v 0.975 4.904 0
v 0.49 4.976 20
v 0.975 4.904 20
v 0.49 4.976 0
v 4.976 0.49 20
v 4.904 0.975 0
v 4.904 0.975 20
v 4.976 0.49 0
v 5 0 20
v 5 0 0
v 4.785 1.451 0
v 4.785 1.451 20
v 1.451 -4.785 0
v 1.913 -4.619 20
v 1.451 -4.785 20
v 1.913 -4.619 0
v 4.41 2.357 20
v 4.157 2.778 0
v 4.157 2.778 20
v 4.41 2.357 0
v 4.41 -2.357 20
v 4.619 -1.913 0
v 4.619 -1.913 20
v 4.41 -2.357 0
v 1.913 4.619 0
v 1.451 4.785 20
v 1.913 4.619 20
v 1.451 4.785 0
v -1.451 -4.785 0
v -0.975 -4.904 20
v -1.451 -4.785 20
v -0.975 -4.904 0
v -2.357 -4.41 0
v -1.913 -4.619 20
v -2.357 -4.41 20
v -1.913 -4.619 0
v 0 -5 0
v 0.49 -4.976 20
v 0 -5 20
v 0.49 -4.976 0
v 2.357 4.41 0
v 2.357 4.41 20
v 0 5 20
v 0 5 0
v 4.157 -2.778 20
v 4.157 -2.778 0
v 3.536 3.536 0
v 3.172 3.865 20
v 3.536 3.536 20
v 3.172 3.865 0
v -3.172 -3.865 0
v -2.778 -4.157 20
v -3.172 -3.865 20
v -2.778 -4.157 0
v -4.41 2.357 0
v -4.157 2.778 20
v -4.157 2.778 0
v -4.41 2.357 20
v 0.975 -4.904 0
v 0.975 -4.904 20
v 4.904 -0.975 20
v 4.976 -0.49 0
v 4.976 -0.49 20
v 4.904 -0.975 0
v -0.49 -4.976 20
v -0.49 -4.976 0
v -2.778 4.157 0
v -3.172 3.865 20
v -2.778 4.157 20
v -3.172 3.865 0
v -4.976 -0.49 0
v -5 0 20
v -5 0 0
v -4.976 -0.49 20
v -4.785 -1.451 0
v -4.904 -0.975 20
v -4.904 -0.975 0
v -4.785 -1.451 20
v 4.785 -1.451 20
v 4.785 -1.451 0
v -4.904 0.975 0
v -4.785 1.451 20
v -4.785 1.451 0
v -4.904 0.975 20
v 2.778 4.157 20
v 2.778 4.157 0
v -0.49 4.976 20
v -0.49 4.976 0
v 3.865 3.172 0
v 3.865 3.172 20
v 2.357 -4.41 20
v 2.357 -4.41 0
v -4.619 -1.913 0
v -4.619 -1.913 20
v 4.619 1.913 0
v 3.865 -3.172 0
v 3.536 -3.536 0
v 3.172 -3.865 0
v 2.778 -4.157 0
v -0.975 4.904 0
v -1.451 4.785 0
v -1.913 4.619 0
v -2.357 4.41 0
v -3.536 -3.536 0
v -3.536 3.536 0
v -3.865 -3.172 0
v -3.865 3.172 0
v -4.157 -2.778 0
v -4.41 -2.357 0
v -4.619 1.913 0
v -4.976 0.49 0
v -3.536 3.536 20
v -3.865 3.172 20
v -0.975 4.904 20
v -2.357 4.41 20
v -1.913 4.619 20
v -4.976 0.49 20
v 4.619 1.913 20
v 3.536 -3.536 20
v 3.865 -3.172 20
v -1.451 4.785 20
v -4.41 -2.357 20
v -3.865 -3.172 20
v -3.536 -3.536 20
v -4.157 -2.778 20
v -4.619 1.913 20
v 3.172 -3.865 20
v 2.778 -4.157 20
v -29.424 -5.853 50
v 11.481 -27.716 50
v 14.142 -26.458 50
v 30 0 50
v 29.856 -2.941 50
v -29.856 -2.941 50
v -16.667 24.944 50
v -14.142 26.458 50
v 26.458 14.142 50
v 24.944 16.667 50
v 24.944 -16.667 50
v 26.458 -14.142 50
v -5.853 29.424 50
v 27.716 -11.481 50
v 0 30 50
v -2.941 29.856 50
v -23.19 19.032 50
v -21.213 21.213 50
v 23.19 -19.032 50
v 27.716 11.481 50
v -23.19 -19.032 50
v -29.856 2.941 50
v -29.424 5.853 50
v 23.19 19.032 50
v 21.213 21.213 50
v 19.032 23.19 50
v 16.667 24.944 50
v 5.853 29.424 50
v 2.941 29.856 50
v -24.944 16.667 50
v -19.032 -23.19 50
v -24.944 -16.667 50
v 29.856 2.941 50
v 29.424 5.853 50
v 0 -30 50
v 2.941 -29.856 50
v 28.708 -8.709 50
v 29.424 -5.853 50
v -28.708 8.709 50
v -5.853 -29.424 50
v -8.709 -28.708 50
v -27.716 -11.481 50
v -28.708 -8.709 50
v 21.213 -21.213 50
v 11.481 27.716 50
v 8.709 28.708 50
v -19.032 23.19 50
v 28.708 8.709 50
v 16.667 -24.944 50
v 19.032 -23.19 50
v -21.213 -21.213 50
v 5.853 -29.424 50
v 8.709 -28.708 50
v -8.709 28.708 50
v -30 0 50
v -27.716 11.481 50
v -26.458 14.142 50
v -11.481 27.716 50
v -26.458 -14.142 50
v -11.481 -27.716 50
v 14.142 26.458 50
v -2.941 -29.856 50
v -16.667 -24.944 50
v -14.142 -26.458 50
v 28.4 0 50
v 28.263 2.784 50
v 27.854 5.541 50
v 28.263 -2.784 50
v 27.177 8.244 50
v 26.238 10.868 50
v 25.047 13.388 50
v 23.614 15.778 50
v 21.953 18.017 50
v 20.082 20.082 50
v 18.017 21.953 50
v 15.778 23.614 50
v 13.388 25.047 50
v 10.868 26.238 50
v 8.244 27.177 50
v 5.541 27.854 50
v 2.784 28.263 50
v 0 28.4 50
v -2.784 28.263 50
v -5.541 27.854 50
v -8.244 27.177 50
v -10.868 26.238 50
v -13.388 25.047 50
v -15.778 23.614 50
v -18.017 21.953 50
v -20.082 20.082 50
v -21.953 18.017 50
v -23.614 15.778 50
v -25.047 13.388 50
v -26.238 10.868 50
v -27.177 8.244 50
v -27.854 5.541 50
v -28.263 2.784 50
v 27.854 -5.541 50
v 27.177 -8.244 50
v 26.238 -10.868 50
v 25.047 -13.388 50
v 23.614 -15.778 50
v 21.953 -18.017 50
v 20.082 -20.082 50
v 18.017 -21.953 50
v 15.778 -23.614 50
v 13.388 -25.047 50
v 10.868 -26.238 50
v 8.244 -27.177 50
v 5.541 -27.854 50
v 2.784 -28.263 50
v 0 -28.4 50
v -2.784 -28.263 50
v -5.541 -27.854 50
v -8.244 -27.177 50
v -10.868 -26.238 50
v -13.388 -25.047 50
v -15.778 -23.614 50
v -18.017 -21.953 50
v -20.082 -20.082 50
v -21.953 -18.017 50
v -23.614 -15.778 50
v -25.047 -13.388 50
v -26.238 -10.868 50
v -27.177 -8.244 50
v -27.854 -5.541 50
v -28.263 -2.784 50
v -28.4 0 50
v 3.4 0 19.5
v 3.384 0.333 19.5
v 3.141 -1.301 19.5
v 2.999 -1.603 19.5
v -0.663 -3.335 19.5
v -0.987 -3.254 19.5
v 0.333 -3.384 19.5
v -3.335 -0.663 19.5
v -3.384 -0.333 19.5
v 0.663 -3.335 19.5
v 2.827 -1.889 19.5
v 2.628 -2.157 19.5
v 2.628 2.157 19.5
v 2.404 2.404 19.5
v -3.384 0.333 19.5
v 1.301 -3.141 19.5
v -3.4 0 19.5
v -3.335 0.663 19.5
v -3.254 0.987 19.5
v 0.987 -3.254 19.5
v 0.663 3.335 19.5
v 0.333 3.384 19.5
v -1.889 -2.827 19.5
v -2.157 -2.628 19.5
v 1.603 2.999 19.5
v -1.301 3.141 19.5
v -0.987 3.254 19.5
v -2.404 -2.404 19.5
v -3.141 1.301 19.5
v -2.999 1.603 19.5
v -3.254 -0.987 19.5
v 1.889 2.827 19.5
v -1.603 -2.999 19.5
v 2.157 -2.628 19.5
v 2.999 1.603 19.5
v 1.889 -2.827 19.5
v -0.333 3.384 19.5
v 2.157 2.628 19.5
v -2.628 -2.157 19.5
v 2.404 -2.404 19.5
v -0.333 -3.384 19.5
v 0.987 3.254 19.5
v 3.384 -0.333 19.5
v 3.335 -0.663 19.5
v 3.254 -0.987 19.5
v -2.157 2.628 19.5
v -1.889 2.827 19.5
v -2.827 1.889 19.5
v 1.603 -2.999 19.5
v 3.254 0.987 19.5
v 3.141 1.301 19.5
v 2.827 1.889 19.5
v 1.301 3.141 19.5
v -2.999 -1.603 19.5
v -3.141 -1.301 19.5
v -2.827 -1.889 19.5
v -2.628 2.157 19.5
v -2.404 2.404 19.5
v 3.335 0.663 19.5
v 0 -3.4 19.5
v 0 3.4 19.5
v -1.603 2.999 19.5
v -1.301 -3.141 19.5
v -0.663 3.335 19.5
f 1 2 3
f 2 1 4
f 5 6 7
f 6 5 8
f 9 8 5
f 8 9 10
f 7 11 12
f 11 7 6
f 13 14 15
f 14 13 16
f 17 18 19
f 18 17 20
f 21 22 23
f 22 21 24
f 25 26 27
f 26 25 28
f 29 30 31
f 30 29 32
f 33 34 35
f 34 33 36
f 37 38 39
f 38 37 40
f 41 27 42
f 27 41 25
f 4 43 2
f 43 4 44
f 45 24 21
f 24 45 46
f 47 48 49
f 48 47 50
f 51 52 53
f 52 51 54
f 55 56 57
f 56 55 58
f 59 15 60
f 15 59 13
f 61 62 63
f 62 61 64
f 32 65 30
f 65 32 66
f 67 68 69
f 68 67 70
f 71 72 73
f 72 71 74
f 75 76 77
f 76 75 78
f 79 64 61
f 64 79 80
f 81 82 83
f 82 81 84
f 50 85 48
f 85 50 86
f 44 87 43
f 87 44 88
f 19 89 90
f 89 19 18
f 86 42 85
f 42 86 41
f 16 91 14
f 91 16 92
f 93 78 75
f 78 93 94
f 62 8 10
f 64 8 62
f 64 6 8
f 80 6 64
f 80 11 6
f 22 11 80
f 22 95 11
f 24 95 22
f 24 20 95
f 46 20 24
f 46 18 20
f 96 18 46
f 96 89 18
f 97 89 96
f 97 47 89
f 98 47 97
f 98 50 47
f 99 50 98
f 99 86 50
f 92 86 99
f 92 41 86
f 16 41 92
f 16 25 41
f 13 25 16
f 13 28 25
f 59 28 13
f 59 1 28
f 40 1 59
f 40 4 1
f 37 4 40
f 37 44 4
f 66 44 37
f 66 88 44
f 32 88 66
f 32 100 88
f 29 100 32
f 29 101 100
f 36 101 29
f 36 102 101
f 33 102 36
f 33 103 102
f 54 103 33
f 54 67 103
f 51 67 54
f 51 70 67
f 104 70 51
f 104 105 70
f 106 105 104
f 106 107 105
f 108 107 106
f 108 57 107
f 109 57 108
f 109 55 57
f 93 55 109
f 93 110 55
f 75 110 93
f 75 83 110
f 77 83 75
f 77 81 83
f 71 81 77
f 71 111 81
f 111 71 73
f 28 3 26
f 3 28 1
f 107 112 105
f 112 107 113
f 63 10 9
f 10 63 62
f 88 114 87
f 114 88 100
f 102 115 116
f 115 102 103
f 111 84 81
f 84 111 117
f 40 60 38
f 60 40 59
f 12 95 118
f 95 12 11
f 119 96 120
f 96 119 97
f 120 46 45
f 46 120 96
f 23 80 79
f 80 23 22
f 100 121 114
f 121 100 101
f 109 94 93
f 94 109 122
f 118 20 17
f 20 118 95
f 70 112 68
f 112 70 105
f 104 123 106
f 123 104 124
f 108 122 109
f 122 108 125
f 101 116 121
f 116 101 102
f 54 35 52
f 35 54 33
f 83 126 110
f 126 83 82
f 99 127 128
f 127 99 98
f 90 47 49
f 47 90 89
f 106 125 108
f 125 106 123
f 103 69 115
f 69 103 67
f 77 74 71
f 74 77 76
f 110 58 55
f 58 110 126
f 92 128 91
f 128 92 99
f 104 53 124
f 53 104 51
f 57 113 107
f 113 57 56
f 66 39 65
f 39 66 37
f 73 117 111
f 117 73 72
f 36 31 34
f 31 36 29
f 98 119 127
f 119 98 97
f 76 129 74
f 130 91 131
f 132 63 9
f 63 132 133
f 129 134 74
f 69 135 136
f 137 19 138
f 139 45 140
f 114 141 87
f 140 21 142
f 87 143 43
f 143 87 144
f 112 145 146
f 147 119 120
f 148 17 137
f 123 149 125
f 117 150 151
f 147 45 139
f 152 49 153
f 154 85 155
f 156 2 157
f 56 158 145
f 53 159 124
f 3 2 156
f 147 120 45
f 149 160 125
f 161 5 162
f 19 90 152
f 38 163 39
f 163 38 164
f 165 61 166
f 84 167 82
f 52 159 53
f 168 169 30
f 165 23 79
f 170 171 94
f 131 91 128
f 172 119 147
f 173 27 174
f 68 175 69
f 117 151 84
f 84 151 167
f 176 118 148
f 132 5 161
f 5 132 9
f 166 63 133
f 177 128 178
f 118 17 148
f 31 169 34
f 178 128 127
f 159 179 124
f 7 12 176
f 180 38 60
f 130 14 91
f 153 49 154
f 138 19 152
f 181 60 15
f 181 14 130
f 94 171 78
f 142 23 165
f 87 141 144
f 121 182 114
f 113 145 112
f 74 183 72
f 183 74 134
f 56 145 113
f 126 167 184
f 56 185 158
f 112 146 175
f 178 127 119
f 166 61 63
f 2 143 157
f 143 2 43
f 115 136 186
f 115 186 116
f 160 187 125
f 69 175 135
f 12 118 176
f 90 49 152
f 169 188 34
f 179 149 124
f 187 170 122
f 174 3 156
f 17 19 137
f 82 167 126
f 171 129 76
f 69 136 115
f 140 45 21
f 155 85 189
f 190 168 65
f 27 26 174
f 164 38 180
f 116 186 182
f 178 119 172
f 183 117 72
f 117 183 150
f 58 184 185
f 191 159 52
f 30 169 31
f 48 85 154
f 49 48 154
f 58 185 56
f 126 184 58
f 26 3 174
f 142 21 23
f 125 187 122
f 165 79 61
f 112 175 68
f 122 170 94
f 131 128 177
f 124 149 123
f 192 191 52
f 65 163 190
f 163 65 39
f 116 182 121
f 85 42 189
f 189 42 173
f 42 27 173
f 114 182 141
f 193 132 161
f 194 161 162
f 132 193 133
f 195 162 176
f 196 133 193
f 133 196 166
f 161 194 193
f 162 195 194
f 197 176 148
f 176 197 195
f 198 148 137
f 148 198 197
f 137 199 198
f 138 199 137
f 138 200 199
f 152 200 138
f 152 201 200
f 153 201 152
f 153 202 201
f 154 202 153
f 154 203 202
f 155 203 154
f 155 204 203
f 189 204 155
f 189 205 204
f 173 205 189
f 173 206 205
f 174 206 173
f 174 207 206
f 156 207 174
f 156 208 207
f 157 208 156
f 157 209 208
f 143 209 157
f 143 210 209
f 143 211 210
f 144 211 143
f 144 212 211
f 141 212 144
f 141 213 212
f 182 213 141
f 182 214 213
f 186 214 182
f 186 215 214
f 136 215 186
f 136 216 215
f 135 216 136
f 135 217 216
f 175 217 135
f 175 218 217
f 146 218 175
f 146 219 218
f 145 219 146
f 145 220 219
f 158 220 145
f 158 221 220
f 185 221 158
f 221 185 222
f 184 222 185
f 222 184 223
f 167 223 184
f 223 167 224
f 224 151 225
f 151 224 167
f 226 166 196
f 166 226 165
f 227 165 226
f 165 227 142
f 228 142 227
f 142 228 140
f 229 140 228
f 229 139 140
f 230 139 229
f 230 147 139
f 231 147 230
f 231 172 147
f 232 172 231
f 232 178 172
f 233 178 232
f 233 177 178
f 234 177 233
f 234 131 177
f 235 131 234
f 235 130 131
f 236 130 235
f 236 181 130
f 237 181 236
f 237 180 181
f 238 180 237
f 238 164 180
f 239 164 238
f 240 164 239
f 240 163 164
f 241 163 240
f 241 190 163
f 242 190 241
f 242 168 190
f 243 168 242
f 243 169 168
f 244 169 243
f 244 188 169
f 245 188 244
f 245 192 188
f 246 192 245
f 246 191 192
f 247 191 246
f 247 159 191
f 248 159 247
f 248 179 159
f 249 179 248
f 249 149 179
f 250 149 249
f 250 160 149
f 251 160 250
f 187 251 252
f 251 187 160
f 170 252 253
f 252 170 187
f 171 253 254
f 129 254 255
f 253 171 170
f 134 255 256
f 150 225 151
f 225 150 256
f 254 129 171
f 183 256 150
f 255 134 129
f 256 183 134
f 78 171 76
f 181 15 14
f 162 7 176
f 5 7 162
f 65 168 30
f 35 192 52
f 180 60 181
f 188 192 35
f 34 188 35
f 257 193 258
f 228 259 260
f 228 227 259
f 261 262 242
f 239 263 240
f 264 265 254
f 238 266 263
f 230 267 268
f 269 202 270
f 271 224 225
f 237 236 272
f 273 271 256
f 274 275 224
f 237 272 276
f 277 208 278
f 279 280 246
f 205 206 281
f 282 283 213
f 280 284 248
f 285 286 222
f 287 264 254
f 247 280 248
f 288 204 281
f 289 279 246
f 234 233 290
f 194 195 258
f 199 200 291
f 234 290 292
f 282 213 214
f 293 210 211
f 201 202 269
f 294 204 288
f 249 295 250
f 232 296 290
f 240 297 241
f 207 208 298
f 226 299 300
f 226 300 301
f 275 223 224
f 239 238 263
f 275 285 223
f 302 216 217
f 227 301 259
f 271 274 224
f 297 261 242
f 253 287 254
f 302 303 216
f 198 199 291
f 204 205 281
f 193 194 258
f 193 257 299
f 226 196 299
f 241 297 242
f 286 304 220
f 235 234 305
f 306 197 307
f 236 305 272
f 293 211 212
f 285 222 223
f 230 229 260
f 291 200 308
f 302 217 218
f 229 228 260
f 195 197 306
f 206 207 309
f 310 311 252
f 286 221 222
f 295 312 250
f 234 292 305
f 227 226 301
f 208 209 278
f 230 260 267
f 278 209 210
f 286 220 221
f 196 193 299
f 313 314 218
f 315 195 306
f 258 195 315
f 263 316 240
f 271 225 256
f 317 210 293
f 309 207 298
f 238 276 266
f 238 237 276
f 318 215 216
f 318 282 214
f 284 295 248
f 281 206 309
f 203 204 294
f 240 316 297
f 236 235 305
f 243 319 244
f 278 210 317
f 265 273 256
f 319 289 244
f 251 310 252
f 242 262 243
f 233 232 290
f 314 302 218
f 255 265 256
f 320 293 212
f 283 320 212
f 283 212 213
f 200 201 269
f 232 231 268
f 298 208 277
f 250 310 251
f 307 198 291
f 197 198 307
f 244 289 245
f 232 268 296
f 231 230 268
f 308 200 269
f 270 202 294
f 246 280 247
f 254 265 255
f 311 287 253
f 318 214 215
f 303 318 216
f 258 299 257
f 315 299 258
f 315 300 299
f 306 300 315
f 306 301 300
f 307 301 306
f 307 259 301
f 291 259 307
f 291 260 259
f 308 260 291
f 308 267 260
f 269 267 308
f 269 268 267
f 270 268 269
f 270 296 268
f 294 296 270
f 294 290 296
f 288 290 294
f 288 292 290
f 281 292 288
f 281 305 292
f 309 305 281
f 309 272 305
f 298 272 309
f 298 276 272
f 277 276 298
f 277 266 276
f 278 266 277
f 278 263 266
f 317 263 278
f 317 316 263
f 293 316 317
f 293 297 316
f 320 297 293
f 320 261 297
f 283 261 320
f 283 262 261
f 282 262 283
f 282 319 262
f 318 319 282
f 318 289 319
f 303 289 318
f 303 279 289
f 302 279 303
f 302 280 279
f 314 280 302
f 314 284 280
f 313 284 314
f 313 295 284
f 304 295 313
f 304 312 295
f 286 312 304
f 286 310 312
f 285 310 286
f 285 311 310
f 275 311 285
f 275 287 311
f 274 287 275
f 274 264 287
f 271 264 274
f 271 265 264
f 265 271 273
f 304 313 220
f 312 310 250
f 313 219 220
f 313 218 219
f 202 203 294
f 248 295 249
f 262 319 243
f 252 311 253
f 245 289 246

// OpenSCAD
// Lab funnel - printed upright, open at top and bottom
// Units: mm

$fn = 64;

// --- Dimensions ---
spout_od      = 10;    // spout outer diameter (z = 0 to 20)
spout_length  = 20;    // spout length
cone_top_od   = 10;    // cone outer diameter at spout junction (z = 20)
cone_rim_od   = 60;    // cone rim outer diameter (z = 50)
cone_height   = 30;    // cone height (z = 20 to 50)
wall          = 1.6;   // wall thickness everywhere

// --- Derived ---
spout_id = spout_od - 2 * wall;   // bore of spout
eps      = 0.5;                  // cutter overshoot

// --- Model ---
difference() {
    union() {
        // Spout (tube)
        cylinder(d = spout_od, h = spout_length);
        // Cone
        translate([0, 0, spout_length])
            cylinder(d1 = cone_top_od, d2 = cone_rim_od, h = cone_height);
    }
    // Through-bore: spout bore up to cone, then cone wall thins to rim (open top)
    translate([0, 0, spout_length - eps])
        cylinder(d1 = spout_id, d2 = cone_rim_od - 2 * wall, h = cone_height + eps);
}
